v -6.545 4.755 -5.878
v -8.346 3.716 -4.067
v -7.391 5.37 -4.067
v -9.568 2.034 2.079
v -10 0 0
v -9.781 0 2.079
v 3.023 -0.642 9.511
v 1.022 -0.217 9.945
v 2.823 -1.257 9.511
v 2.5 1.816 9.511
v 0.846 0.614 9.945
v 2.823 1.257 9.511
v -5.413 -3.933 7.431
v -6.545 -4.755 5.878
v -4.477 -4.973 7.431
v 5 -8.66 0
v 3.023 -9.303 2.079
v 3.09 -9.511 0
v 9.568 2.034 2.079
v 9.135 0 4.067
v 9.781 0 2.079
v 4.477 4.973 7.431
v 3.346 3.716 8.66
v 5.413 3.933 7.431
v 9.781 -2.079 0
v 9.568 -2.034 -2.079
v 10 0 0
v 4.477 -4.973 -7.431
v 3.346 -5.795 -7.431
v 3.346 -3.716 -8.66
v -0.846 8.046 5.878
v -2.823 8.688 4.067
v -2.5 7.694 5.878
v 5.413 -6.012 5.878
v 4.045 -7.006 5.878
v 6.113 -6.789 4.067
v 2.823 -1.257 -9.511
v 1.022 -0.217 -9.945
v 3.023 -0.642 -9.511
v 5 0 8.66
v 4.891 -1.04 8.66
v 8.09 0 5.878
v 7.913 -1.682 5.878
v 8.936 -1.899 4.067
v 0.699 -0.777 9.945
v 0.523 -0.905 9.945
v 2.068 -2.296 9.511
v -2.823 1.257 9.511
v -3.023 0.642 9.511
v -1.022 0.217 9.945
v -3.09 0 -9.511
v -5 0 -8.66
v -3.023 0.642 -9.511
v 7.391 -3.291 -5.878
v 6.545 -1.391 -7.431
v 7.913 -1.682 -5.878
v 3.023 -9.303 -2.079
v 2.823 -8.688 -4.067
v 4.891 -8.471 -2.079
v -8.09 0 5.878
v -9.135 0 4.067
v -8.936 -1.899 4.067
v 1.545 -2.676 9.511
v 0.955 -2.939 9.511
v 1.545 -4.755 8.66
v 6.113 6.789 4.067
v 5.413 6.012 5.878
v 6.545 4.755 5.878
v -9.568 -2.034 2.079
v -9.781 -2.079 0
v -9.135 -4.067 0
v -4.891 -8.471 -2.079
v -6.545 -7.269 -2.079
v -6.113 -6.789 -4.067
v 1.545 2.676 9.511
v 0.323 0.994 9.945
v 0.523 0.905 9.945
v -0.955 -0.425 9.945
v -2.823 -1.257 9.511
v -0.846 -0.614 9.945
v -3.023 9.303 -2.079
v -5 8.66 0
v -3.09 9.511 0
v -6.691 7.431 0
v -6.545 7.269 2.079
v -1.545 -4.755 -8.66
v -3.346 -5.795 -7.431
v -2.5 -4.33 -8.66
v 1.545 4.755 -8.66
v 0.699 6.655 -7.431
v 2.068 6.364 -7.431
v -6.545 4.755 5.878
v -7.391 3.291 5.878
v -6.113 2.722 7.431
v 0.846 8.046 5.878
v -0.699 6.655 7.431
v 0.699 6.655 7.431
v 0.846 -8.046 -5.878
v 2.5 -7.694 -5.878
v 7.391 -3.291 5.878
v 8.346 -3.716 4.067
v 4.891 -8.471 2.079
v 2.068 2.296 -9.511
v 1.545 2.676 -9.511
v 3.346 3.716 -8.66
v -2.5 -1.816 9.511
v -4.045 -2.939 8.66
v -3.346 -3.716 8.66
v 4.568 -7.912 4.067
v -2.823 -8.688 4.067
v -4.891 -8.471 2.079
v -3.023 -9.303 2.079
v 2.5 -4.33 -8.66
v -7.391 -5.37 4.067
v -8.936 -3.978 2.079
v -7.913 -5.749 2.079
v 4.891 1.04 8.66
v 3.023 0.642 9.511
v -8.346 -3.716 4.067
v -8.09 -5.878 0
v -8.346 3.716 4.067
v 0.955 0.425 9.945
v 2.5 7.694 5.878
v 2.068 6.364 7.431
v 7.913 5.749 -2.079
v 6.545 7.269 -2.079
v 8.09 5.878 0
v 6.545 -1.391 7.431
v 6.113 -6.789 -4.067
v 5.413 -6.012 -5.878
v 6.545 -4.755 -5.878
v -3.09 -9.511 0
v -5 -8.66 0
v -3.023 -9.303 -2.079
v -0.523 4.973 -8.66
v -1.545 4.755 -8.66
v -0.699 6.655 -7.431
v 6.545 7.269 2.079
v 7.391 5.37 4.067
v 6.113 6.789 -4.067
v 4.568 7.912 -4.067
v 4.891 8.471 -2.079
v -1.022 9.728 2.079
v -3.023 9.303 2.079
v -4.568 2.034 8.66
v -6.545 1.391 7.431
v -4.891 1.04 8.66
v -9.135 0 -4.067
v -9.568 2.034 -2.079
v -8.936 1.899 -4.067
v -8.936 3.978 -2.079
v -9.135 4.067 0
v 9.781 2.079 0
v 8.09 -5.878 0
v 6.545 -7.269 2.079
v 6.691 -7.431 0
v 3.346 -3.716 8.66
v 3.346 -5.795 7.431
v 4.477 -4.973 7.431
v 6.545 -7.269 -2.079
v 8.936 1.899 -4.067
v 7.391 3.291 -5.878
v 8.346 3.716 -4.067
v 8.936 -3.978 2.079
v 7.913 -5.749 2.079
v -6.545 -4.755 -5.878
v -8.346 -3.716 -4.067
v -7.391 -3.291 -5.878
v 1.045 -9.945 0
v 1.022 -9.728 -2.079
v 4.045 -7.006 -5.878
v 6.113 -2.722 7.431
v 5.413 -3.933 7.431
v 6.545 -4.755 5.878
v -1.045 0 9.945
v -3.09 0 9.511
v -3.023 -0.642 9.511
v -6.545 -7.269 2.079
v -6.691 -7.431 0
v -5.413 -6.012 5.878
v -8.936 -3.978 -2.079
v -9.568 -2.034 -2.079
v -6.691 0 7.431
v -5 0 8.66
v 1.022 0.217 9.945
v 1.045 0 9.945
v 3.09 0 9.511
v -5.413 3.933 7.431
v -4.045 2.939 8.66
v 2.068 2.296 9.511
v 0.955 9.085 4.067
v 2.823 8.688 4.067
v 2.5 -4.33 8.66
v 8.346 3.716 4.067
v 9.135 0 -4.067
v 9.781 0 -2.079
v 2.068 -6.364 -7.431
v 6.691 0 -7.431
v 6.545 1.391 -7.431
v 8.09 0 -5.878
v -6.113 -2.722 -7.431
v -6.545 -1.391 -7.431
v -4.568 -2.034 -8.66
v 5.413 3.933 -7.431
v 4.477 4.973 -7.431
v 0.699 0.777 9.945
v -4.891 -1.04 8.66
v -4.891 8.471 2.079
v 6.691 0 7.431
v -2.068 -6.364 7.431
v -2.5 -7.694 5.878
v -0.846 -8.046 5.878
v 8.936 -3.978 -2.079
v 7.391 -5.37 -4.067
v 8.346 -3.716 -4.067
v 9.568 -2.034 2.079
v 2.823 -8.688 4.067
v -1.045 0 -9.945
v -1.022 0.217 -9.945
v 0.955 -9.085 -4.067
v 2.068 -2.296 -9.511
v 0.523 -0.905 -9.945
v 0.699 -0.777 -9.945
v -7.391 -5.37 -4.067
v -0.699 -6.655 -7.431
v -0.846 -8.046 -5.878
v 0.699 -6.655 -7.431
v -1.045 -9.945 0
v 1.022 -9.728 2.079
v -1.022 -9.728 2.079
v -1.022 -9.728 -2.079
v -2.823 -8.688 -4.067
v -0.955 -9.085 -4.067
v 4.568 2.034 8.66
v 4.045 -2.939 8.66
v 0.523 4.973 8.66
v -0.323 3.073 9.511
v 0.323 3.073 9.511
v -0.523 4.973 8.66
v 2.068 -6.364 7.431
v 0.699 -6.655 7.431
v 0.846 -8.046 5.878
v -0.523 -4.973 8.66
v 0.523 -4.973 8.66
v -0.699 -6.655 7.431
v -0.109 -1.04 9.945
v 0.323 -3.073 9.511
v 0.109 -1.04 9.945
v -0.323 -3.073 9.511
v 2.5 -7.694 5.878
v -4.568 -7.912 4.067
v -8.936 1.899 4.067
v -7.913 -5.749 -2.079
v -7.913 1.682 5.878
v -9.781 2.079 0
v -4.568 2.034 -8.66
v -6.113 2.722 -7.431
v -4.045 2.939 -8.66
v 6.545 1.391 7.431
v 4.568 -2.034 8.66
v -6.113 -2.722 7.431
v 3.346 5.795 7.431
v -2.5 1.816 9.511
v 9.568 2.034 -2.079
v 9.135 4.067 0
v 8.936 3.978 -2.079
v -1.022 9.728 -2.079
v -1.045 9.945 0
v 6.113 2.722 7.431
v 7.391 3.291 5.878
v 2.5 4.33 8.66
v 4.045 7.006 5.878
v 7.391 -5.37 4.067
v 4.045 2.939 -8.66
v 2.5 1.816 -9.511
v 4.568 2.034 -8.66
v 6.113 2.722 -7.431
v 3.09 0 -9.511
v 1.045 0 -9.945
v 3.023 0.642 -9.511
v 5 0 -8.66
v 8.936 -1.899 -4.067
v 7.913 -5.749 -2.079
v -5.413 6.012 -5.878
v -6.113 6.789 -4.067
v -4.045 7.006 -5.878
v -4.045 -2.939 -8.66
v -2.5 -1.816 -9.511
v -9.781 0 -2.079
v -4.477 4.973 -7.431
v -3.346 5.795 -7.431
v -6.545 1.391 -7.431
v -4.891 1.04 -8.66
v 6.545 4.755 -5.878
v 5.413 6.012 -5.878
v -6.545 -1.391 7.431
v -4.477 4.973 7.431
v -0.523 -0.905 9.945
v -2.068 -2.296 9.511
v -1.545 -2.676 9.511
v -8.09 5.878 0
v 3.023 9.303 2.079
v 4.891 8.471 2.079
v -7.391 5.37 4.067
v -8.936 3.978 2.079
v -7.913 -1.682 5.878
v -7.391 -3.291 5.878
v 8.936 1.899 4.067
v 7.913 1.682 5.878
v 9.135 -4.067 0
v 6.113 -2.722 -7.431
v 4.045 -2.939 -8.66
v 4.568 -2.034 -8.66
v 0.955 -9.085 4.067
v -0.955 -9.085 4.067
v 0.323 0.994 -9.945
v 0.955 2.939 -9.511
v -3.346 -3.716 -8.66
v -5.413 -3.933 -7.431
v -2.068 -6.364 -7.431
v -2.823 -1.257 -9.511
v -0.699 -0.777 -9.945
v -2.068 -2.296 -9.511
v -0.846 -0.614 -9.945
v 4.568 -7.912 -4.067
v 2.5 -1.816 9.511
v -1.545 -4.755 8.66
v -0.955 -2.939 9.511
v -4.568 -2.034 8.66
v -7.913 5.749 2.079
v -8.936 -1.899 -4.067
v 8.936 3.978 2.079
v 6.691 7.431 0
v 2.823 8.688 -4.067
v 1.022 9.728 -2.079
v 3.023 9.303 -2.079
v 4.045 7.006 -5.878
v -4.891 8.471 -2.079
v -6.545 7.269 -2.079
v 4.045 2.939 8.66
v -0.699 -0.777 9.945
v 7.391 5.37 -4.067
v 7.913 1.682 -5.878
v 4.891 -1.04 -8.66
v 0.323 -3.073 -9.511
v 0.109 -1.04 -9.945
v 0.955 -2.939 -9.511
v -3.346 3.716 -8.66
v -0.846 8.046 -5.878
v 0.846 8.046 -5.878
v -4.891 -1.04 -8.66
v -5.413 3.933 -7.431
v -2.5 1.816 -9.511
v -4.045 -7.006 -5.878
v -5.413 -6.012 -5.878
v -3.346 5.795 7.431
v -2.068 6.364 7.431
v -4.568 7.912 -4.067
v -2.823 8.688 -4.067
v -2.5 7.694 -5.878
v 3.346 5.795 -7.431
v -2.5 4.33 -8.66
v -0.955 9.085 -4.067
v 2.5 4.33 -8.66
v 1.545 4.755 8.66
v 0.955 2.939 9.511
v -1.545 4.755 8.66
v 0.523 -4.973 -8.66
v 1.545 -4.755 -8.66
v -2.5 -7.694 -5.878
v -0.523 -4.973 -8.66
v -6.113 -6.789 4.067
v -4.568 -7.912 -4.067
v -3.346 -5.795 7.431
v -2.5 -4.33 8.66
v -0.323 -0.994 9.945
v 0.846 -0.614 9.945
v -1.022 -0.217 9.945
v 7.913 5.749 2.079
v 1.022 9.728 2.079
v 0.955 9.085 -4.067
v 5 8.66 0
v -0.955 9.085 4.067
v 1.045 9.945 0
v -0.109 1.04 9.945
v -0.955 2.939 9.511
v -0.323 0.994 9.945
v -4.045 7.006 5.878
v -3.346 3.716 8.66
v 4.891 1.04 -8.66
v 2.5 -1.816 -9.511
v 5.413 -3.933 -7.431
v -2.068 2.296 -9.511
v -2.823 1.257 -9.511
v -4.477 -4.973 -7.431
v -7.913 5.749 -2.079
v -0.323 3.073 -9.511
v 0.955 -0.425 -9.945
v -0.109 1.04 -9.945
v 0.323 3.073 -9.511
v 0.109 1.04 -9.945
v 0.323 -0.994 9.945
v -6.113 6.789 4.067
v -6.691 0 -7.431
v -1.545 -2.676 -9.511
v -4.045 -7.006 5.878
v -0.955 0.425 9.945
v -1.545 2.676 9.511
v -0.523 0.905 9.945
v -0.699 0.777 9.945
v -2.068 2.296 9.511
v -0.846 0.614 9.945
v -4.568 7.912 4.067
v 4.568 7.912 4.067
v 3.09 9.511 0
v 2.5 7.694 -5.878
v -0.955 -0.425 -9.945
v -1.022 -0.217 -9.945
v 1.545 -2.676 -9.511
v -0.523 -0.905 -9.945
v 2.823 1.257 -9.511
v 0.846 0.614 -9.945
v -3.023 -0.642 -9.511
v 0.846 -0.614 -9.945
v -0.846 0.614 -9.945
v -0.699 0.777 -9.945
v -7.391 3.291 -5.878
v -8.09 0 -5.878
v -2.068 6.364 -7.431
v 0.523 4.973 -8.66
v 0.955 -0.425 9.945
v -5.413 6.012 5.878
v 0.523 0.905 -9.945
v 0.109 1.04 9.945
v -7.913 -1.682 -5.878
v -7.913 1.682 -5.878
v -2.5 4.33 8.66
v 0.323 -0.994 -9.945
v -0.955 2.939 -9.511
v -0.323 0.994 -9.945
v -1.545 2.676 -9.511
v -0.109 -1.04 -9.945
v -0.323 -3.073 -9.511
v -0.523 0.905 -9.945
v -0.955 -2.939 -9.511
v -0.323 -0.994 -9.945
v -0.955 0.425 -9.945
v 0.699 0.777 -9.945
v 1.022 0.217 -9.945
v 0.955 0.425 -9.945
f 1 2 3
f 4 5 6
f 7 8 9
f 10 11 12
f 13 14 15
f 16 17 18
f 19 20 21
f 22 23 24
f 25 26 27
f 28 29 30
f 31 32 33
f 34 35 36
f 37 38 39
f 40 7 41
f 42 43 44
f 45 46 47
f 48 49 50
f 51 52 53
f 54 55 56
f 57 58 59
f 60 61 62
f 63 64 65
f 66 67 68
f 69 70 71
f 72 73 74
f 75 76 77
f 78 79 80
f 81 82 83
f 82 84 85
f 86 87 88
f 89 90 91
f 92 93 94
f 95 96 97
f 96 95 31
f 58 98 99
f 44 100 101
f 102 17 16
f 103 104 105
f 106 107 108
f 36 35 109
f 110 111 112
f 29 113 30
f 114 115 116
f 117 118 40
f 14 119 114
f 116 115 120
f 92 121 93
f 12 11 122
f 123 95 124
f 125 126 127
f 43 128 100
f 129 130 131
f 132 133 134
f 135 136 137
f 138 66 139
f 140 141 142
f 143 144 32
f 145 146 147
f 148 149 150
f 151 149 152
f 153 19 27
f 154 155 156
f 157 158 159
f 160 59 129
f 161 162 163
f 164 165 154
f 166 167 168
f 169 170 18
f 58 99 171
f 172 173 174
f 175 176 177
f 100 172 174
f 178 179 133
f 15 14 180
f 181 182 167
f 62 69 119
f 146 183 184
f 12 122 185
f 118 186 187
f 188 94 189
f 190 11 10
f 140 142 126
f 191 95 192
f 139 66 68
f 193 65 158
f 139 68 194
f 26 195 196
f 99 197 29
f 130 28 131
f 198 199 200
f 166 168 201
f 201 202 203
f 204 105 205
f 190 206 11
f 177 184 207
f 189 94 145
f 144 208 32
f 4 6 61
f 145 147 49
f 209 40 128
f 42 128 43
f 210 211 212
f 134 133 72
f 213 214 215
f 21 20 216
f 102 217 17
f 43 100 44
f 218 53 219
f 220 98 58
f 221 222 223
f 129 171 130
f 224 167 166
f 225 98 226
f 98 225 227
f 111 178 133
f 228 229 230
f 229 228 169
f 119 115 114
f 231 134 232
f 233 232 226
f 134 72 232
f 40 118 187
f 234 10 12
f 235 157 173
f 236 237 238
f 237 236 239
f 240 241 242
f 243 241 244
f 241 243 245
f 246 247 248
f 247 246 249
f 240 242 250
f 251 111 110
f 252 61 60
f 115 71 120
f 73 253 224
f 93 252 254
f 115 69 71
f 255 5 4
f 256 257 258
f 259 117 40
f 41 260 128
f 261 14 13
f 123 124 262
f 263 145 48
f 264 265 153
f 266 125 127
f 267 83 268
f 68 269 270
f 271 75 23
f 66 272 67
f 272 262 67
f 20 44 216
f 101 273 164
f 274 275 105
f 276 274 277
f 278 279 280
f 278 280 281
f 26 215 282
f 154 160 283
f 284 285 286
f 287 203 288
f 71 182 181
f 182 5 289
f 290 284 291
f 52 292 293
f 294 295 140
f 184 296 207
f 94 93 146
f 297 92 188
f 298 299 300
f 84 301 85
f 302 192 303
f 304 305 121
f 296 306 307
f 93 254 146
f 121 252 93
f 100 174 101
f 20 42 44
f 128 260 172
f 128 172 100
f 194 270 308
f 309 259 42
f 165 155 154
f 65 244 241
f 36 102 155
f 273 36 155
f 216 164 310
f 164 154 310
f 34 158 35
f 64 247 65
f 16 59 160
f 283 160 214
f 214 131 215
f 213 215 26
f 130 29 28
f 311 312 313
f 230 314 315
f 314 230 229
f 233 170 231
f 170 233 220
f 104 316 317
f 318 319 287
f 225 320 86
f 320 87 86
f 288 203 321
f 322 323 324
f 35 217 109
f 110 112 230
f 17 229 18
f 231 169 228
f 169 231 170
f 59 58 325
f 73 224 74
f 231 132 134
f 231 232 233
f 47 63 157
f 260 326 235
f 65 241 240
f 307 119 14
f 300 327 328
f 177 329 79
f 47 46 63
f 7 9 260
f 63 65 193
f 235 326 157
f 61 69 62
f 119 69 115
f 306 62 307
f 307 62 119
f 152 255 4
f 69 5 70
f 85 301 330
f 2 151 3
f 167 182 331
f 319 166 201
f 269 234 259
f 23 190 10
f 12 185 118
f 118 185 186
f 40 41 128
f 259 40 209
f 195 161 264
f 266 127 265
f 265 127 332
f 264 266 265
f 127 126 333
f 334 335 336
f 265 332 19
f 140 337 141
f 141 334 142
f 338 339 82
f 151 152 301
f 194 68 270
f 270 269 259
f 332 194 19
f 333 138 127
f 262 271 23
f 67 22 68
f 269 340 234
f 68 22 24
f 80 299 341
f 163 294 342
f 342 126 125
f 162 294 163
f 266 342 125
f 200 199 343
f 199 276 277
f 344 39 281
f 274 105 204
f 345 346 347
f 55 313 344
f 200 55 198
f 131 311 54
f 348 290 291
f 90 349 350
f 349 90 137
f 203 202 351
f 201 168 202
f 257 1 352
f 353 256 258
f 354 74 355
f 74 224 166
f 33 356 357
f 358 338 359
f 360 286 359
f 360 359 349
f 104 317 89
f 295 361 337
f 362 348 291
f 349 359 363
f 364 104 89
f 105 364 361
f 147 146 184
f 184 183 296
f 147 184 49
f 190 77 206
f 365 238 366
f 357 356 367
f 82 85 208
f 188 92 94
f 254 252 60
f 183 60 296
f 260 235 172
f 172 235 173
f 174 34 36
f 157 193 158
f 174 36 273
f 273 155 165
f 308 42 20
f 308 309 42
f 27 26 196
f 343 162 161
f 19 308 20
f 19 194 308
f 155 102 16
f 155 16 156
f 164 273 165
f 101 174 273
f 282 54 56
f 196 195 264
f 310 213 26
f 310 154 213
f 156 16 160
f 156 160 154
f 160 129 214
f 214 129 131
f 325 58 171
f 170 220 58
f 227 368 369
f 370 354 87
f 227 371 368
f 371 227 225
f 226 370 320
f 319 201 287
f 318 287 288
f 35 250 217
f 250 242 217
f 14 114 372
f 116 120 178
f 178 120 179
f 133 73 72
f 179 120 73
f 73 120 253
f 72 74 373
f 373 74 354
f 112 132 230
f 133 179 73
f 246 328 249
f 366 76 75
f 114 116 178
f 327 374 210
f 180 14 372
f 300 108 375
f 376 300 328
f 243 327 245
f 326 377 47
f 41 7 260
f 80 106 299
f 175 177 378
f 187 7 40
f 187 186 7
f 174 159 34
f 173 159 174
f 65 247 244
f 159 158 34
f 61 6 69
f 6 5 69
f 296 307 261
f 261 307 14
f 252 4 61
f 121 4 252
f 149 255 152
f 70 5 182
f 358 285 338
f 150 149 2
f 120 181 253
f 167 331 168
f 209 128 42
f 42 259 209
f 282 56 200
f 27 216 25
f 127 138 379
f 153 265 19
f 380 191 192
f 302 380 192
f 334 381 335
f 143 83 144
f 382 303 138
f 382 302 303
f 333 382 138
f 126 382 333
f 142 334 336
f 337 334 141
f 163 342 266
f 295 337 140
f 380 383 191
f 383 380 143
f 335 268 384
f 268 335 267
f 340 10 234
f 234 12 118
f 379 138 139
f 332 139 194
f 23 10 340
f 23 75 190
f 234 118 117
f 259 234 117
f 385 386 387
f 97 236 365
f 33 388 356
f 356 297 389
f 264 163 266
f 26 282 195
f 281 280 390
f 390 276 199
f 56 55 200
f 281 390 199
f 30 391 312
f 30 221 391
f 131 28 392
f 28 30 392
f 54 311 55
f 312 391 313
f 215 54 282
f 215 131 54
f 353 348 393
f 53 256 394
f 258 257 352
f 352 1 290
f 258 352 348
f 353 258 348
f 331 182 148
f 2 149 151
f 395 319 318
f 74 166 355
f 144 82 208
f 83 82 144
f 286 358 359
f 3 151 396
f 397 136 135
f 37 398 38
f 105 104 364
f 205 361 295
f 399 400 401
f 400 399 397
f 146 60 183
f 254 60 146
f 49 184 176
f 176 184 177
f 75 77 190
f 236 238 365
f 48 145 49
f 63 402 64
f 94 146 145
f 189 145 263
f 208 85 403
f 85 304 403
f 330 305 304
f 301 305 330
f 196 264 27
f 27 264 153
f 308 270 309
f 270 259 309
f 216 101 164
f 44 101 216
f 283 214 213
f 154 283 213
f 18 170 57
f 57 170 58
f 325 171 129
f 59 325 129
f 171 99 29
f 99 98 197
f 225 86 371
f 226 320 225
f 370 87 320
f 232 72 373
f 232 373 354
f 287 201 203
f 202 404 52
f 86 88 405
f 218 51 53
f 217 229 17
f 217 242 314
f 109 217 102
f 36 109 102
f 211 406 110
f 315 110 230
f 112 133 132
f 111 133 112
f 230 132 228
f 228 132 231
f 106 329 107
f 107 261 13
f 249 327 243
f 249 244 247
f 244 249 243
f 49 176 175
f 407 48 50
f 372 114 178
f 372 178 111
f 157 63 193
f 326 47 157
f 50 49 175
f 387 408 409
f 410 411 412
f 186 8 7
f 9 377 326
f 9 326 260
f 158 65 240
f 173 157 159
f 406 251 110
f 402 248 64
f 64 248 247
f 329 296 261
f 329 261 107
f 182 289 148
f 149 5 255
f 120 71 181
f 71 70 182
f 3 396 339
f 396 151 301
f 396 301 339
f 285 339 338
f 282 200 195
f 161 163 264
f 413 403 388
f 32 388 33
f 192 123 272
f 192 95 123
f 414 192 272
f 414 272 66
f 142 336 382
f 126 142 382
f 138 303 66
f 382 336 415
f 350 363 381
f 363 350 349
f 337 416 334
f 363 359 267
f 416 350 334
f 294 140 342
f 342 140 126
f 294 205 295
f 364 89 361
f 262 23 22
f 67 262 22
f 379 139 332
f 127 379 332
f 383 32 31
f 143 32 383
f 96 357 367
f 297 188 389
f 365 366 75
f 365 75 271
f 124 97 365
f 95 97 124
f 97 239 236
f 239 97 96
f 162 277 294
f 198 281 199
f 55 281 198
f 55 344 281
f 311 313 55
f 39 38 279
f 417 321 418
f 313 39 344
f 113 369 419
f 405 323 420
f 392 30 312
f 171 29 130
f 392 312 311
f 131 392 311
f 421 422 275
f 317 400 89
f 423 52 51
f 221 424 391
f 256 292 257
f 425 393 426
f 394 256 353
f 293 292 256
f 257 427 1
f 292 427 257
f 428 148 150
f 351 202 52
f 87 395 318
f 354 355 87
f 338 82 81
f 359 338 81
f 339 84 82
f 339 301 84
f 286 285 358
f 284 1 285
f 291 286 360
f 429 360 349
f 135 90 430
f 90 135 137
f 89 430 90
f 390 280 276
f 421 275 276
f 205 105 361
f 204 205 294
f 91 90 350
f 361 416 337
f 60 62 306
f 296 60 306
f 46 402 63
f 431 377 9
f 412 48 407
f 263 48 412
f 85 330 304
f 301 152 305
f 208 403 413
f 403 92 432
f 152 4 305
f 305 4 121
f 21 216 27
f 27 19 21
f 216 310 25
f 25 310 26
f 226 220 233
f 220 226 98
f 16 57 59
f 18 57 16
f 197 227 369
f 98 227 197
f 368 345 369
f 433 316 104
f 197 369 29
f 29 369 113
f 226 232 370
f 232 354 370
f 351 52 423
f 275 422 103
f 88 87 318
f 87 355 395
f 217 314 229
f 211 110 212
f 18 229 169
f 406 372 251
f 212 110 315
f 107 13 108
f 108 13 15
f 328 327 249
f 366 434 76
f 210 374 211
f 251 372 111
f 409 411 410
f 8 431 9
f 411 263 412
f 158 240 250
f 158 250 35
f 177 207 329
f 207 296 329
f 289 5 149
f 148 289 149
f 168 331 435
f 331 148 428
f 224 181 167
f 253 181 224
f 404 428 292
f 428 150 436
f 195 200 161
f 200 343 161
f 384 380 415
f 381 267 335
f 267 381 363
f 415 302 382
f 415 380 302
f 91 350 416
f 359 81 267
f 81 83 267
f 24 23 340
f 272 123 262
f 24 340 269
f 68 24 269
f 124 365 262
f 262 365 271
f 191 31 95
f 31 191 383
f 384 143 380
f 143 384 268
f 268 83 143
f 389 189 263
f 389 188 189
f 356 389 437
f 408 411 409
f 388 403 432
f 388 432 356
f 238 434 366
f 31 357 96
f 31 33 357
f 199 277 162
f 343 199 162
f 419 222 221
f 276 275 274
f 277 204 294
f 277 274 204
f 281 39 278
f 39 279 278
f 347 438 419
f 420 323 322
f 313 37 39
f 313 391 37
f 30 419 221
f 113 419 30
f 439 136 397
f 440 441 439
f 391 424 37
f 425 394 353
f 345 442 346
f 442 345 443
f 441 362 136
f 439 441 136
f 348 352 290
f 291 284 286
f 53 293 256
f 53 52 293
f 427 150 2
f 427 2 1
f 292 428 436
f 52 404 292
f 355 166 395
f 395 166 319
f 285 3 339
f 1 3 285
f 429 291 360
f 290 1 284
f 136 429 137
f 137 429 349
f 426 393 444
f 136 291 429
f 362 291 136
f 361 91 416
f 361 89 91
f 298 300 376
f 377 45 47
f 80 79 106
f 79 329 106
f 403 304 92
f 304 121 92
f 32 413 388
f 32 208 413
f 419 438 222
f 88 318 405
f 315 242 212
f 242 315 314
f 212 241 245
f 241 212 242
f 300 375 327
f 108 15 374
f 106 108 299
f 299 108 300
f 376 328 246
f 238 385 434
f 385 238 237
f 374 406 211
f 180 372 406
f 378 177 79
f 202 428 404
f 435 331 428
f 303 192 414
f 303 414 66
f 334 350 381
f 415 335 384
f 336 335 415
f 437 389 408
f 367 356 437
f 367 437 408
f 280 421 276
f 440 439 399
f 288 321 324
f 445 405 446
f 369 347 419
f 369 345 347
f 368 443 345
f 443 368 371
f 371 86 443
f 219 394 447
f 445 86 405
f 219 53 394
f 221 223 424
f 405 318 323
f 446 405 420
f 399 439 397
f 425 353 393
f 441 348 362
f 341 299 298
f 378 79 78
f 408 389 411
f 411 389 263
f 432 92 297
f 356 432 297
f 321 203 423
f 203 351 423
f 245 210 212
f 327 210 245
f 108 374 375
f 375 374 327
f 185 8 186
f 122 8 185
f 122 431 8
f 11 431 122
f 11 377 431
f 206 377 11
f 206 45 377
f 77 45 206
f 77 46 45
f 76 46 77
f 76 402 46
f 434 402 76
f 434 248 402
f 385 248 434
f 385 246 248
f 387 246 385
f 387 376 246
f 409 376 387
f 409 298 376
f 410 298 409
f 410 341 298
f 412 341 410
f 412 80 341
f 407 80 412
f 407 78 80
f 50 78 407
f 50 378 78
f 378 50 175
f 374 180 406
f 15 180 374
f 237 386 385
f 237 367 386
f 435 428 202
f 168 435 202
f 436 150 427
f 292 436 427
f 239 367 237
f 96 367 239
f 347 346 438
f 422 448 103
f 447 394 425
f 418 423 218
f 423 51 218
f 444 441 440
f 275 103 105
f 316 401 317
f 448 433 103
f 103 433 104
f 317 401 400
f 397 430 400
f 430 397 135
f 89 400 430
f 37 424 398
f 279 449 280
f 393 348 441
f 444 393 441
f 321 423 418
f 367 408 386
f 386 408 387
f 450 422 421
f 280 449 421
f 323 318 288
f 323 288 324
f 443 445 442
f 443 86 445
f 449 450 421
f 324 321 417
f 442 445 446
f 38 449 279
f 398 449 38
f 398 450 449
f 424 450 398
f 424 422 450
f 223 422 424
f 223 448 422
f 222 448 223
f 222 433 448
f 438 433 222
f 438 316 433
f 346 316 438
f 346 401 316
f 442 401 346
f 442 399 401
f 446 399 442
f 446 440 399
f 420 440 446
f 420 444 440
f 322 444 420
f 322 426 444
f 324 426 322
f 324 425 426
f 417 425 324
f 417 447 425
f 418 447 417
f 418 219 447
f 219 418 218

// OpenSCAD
// This indicates the coincident point
// joint-primitive constraint. 
// square([20, 30], true);
// color(red);
// circle(50);
// cube([10, 30, 20], true);
// cylinder(10, 30, 35);

color("red", 0.5)
translate([0,0,0])
  rotate([0,0,0])
    sphere(10);

color("green", 0.5)
translate([0,0,0])
  rotate([0,0,0])
    sphere(10);
